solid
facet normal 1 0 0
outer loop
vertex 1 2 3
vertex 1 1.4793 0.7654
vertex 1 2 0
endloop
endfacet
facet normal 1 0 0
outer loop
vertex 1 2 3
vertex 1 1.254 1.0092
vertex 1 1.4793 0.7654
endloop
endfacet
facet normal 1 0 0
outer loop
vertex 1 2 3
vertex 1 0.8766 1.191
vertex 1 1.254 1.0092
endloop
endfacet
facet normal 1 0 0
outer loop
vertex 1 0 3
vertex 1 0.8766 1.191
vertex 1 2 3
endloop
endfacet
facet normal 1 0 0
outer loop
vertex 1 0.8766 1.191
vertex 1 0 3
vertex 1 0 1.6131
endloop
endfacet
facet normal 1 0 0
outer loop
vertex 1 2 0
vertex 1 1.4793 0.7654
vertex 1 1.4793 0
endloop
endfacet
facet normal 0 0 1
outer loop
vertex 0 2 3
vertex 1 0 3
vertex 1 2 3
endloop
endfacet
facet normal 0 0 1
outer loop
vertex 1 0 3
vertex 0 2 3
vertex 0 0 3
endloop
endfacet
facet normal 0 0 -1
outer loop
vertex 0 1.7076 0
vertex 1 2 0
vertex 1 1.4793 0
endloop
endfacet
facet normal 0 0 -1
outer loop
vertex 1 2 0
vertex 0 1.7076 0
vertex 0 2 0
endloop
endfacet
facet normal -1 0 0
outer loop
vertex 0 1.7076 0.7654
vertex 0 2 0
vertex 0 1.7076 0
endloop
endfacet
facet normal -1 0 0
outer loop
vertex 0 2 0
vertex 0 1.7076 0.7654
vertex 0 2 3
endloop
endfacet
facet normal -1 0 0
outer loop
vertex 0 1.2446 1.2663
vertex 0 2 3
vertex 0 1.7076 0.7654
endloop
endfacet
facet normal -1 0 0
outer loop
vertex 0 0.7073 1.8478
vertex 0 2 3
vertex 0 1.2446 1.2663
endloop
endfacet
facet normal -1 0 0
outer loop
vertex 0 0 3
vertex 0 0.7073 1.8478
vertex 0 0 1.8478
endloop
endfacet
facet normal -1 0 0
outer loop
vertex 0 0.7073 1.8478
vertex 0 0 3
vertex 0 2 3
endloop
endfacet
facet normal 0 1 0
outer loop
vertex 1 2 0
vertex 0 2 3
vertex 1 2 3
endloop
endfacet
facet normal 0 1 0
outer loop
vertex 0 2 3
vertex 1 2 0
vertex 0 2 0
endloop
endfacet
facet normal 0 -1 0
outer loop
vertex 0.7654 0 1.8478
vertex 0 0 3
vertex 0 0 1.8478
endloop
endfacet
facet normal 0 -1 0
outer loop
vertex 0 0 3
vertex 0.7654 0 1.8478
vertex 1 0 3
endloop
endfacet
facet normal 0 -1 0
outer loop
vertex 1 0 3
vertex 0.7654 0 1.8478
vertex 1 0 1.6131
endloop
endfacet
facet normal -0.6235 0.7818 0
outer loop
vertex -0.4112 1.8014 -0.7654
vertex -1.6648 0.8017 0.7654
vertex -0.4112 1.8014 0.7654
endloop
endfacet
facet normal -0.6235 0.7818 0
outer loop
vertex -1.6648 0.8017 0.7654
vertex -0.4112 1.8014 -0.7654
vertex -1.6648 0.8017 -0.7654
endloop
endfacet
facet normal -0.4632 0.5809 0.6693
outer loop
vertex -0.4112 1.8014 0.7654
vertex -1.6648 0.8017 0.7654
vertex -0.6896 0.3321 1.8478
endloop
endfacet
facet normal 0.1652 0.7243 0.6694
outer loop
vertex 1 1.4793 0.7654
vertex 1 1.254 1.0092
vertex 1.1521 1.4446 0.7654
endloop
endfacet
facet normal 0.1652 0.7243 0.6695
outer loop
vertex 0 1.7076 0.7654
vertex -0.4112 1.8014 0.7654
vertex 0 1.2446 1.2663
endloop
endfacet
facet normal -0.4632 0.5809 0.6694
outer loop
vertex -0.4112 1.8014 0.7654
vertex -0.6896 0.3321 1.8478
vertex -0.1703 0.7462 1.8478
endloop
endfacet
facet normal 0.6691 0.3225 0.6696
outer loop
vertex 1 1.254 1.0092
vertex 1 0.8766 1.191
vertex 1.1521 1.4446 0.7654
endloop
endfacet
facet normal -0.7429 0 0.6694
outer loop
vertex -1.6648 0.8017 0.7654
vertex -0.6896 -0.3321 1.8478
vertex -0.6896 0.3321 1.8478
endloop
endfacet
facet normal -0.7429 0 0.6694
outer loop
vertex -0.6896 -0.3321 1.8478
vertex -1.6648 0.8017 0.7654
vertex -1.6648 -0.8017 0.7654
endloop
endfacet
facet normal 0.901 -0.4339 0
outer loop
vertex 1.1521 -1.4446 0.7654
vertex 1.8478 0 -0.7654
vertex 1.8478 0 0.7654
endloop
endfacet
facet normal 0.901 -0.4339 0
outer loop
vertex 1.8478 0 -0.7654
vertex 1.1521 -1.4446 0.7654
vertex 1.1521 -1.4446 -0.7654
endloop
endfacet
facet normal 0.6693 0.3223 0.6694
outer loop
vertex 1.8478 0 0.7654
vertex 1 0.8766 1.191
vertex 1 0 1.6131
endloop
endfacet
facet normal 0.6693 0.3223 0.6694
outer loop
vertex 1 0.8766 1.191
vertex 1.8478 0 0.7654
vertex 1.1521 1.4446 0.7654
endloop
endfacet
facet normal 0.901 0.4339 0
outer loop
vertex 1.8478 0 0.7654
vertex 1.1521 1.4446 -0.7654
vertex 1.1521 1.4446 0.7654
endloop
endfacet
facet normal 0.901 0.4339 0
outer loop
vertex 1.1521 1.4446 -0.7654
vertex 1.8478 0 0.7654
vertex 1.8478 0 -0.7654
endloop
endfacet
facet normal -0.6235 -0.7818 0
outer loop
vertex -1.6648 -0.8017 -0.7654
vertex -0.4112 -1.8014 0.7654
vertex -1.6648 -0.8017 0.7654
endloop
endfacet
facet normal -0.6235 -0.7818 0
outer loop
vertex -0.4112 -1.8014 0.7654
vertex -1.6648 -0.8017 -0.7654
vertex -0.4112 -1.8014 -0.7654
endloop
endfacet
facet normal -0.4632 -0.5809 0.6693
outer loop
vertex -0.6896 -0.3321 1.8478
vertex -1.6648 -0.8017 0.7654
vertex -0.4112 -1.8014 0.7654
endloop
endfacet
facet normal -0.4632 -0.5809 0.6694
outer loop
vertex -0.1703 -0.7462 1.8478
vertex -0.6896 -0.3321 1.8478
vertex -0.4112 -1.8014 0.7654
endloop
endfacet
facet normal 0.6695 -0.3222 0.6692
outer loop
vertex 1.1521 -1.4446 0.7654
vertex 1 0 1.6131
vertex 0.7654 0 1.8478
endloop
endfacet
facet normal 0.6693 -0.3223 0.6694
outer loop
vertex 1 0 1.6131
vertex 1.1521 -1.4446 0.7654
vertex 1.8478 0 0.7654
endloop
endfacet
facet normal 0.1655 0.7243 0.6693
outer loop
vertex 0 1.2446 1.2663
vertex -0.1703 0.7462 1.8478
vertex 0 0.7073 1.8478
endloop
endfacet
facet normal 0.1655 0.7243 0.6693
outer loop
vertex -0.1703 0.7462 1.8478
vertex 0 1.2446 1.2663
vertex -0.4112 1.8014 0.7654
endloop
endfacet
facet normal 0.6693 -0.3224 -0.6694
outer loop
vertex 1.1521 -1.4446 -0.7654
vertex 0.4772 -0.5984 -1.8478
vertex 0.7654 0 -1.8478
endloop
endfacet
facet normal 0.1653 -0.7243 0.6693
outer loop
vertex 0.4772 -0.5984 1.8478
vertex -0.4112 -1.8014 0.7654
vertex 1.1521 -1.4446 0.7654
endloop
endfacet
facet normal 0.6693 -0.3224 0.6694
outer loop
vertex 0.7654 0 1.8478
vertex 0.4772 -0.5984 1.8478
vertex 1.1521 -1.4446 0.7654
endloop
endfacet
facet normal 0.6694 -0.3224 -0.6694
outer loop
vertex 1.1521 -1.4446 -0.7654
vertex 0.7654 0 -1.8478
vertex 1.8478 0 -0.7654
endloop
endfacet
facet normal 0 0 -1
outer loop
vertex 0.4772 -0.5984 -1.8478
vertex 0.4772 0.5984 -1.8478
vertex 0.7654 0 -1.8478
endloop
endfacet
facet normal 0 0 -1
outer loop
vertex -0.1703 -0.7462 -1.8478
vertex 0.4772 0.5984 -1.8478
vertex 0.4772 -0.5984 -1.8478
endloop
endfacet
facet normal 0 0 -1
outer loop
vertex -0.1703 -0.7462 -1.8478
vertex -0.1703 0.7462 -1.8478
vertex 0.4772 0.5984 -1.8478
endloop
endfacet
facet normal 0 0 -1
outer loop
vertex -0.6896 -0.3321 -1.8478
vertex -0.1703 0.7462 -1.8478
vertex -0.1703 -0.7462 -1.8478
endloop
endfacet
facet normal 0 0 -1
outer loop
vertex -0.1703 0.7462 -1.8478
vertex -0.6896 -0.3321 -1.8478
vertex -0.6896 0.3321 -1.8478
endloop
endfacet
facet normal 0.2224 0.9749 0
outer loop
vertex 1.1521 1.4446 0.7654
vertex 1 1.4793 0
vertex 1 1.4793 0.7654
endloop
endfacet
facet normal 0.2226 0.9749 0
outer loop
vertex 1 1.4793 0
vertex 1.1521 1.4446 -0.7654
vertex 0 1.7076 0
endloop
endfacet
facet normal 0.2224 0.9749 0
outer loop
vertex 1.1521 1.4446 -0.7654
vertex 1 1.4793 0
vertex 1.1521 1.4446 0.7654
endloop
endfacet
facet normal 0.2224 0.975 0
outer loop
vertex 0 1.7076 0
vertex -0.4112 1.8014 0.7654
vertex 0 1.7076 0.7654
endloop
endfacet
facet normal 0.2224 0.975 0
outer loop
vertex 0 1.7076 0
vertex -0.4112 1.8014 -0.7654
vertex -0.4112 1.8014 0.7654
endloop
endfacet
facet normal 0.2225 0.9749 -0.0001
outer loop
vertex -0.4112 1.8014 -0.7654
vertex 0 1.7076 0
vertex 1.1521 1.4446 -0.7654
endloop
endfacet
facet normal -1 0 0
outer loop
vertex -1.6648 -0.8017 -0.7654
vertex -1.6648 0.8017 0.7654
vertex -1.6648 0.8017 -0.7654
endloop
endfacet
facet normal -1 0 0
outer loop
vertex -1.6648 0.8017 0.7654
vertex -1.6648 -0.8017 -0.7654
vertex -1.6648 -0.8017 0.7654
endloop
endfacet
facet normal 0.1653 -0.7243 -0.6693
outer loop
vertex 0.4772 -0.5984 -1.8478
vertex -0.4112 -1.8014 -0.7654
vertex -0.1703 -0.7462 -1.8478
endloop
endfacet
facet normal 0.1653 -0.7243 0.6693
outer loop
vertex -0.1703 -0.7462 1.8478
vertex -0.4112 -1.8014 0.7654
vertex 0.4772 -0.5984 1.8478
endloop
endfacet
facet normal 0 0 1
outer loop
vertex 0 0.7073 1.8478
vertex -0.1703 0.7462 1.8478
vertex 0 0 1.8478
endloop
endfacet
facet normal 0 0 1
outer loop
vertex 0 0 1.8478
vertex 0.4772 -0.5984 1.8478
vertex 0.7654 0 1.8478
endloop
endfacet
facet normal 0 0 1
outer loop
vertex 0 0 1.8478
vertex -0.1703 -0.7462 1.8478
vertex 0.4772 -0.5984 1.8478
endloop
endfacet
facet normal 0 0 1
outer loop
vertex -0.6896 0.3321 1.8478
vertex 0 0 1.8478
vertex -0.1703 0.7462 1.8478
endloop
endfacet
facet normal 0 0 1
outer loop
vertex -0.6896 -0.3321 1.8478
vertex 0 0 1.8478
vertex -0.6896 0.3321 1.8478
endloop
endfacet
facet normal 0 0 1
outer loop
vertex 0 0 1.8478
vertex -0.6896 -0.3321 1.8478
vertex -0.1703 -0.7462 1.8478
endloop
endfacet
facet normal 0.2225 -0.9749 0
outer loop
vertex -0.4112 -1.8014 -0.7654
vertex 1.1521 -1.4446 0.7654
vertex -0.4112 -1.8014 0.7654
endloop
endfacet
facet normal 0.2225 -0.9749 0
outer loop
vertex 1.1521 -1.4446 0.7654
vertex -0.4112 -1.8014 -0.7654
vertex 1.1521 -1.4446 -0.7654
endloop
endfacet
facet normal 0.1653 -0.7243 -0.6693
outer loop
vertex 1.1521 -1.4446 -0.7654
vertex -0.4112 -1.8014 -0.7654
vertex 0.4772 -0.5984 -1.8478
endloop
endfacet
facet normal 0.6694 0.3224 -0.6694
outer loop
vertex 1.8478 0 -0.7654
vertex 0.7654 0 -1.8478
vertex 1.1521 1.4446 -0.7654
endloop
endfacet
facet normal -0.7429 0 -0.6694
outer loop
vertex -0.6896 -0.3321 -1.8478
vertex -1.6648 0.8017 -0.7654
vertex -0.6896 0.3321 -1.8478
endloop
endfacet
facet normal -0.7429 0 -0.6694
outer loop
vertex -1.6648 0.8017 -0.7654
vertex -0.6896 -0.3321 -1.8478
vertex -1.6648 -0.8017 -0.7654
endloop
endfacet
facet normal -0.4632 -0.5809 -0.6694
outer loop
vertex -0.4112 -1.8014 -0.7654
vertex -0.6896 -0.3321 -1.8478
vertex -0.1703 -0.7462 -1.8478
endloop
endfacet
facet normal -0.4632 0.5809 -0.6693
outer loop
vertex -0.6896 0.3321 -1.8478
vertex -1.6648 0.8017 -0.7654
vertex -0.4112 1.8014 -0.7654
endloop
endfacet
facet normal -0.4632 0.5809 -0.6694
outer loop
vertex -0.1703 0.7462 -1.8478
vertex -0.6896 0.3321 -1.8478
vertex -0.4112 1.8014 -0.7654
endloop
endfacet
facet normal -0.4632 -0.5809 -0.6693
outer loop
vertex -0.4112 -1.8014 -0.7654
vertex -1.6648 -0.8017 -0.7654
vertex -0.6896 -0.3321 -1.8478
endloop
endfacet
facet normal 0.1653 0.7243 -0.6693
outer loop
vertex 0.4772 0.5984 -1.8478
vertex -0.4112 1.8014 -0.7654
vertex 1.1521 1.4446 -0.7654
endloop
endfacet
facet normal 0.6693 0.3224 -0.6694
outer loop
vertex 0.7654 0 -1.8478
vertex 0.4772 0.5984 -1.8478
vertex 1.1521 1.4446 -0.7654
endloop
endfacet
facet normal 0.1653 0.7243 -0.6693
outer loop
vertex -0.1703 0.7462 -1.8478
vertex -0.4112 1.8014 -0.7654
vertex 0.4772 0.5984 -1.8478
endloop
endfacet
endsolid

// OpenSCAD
/* Block comment at the top.
   Spans multiple lines. */
// Numeric literal forms.
a = 1;
b = 1.5;
c = .5;
d = 1.;
e = 2e3;
f = 1.5e-2;
g = -4;
h = a-1;      // no-space subtraction must lex as `a - 1`
i = -a;
j = 3--2;     // 3 - (-2)

// Strings with escapes.
s1 = "plain";
s2 = "with \"quotes\"";
s3 = "tab\there";
s4 = "line\nbreak";
s5 = "back\\slash";

echo(a, b, c, d, e, f, g, h, i, j);
echo(s1, s2, s3, s4, s5);

cube(/* inline */ [1, /* mid-vector */ 2, 3]); // trailing comment
sphere(
    // comment inside an argument list
    r = 2
);

translate([0, 0, h /* end-of-expression comment */]) cube(1);
